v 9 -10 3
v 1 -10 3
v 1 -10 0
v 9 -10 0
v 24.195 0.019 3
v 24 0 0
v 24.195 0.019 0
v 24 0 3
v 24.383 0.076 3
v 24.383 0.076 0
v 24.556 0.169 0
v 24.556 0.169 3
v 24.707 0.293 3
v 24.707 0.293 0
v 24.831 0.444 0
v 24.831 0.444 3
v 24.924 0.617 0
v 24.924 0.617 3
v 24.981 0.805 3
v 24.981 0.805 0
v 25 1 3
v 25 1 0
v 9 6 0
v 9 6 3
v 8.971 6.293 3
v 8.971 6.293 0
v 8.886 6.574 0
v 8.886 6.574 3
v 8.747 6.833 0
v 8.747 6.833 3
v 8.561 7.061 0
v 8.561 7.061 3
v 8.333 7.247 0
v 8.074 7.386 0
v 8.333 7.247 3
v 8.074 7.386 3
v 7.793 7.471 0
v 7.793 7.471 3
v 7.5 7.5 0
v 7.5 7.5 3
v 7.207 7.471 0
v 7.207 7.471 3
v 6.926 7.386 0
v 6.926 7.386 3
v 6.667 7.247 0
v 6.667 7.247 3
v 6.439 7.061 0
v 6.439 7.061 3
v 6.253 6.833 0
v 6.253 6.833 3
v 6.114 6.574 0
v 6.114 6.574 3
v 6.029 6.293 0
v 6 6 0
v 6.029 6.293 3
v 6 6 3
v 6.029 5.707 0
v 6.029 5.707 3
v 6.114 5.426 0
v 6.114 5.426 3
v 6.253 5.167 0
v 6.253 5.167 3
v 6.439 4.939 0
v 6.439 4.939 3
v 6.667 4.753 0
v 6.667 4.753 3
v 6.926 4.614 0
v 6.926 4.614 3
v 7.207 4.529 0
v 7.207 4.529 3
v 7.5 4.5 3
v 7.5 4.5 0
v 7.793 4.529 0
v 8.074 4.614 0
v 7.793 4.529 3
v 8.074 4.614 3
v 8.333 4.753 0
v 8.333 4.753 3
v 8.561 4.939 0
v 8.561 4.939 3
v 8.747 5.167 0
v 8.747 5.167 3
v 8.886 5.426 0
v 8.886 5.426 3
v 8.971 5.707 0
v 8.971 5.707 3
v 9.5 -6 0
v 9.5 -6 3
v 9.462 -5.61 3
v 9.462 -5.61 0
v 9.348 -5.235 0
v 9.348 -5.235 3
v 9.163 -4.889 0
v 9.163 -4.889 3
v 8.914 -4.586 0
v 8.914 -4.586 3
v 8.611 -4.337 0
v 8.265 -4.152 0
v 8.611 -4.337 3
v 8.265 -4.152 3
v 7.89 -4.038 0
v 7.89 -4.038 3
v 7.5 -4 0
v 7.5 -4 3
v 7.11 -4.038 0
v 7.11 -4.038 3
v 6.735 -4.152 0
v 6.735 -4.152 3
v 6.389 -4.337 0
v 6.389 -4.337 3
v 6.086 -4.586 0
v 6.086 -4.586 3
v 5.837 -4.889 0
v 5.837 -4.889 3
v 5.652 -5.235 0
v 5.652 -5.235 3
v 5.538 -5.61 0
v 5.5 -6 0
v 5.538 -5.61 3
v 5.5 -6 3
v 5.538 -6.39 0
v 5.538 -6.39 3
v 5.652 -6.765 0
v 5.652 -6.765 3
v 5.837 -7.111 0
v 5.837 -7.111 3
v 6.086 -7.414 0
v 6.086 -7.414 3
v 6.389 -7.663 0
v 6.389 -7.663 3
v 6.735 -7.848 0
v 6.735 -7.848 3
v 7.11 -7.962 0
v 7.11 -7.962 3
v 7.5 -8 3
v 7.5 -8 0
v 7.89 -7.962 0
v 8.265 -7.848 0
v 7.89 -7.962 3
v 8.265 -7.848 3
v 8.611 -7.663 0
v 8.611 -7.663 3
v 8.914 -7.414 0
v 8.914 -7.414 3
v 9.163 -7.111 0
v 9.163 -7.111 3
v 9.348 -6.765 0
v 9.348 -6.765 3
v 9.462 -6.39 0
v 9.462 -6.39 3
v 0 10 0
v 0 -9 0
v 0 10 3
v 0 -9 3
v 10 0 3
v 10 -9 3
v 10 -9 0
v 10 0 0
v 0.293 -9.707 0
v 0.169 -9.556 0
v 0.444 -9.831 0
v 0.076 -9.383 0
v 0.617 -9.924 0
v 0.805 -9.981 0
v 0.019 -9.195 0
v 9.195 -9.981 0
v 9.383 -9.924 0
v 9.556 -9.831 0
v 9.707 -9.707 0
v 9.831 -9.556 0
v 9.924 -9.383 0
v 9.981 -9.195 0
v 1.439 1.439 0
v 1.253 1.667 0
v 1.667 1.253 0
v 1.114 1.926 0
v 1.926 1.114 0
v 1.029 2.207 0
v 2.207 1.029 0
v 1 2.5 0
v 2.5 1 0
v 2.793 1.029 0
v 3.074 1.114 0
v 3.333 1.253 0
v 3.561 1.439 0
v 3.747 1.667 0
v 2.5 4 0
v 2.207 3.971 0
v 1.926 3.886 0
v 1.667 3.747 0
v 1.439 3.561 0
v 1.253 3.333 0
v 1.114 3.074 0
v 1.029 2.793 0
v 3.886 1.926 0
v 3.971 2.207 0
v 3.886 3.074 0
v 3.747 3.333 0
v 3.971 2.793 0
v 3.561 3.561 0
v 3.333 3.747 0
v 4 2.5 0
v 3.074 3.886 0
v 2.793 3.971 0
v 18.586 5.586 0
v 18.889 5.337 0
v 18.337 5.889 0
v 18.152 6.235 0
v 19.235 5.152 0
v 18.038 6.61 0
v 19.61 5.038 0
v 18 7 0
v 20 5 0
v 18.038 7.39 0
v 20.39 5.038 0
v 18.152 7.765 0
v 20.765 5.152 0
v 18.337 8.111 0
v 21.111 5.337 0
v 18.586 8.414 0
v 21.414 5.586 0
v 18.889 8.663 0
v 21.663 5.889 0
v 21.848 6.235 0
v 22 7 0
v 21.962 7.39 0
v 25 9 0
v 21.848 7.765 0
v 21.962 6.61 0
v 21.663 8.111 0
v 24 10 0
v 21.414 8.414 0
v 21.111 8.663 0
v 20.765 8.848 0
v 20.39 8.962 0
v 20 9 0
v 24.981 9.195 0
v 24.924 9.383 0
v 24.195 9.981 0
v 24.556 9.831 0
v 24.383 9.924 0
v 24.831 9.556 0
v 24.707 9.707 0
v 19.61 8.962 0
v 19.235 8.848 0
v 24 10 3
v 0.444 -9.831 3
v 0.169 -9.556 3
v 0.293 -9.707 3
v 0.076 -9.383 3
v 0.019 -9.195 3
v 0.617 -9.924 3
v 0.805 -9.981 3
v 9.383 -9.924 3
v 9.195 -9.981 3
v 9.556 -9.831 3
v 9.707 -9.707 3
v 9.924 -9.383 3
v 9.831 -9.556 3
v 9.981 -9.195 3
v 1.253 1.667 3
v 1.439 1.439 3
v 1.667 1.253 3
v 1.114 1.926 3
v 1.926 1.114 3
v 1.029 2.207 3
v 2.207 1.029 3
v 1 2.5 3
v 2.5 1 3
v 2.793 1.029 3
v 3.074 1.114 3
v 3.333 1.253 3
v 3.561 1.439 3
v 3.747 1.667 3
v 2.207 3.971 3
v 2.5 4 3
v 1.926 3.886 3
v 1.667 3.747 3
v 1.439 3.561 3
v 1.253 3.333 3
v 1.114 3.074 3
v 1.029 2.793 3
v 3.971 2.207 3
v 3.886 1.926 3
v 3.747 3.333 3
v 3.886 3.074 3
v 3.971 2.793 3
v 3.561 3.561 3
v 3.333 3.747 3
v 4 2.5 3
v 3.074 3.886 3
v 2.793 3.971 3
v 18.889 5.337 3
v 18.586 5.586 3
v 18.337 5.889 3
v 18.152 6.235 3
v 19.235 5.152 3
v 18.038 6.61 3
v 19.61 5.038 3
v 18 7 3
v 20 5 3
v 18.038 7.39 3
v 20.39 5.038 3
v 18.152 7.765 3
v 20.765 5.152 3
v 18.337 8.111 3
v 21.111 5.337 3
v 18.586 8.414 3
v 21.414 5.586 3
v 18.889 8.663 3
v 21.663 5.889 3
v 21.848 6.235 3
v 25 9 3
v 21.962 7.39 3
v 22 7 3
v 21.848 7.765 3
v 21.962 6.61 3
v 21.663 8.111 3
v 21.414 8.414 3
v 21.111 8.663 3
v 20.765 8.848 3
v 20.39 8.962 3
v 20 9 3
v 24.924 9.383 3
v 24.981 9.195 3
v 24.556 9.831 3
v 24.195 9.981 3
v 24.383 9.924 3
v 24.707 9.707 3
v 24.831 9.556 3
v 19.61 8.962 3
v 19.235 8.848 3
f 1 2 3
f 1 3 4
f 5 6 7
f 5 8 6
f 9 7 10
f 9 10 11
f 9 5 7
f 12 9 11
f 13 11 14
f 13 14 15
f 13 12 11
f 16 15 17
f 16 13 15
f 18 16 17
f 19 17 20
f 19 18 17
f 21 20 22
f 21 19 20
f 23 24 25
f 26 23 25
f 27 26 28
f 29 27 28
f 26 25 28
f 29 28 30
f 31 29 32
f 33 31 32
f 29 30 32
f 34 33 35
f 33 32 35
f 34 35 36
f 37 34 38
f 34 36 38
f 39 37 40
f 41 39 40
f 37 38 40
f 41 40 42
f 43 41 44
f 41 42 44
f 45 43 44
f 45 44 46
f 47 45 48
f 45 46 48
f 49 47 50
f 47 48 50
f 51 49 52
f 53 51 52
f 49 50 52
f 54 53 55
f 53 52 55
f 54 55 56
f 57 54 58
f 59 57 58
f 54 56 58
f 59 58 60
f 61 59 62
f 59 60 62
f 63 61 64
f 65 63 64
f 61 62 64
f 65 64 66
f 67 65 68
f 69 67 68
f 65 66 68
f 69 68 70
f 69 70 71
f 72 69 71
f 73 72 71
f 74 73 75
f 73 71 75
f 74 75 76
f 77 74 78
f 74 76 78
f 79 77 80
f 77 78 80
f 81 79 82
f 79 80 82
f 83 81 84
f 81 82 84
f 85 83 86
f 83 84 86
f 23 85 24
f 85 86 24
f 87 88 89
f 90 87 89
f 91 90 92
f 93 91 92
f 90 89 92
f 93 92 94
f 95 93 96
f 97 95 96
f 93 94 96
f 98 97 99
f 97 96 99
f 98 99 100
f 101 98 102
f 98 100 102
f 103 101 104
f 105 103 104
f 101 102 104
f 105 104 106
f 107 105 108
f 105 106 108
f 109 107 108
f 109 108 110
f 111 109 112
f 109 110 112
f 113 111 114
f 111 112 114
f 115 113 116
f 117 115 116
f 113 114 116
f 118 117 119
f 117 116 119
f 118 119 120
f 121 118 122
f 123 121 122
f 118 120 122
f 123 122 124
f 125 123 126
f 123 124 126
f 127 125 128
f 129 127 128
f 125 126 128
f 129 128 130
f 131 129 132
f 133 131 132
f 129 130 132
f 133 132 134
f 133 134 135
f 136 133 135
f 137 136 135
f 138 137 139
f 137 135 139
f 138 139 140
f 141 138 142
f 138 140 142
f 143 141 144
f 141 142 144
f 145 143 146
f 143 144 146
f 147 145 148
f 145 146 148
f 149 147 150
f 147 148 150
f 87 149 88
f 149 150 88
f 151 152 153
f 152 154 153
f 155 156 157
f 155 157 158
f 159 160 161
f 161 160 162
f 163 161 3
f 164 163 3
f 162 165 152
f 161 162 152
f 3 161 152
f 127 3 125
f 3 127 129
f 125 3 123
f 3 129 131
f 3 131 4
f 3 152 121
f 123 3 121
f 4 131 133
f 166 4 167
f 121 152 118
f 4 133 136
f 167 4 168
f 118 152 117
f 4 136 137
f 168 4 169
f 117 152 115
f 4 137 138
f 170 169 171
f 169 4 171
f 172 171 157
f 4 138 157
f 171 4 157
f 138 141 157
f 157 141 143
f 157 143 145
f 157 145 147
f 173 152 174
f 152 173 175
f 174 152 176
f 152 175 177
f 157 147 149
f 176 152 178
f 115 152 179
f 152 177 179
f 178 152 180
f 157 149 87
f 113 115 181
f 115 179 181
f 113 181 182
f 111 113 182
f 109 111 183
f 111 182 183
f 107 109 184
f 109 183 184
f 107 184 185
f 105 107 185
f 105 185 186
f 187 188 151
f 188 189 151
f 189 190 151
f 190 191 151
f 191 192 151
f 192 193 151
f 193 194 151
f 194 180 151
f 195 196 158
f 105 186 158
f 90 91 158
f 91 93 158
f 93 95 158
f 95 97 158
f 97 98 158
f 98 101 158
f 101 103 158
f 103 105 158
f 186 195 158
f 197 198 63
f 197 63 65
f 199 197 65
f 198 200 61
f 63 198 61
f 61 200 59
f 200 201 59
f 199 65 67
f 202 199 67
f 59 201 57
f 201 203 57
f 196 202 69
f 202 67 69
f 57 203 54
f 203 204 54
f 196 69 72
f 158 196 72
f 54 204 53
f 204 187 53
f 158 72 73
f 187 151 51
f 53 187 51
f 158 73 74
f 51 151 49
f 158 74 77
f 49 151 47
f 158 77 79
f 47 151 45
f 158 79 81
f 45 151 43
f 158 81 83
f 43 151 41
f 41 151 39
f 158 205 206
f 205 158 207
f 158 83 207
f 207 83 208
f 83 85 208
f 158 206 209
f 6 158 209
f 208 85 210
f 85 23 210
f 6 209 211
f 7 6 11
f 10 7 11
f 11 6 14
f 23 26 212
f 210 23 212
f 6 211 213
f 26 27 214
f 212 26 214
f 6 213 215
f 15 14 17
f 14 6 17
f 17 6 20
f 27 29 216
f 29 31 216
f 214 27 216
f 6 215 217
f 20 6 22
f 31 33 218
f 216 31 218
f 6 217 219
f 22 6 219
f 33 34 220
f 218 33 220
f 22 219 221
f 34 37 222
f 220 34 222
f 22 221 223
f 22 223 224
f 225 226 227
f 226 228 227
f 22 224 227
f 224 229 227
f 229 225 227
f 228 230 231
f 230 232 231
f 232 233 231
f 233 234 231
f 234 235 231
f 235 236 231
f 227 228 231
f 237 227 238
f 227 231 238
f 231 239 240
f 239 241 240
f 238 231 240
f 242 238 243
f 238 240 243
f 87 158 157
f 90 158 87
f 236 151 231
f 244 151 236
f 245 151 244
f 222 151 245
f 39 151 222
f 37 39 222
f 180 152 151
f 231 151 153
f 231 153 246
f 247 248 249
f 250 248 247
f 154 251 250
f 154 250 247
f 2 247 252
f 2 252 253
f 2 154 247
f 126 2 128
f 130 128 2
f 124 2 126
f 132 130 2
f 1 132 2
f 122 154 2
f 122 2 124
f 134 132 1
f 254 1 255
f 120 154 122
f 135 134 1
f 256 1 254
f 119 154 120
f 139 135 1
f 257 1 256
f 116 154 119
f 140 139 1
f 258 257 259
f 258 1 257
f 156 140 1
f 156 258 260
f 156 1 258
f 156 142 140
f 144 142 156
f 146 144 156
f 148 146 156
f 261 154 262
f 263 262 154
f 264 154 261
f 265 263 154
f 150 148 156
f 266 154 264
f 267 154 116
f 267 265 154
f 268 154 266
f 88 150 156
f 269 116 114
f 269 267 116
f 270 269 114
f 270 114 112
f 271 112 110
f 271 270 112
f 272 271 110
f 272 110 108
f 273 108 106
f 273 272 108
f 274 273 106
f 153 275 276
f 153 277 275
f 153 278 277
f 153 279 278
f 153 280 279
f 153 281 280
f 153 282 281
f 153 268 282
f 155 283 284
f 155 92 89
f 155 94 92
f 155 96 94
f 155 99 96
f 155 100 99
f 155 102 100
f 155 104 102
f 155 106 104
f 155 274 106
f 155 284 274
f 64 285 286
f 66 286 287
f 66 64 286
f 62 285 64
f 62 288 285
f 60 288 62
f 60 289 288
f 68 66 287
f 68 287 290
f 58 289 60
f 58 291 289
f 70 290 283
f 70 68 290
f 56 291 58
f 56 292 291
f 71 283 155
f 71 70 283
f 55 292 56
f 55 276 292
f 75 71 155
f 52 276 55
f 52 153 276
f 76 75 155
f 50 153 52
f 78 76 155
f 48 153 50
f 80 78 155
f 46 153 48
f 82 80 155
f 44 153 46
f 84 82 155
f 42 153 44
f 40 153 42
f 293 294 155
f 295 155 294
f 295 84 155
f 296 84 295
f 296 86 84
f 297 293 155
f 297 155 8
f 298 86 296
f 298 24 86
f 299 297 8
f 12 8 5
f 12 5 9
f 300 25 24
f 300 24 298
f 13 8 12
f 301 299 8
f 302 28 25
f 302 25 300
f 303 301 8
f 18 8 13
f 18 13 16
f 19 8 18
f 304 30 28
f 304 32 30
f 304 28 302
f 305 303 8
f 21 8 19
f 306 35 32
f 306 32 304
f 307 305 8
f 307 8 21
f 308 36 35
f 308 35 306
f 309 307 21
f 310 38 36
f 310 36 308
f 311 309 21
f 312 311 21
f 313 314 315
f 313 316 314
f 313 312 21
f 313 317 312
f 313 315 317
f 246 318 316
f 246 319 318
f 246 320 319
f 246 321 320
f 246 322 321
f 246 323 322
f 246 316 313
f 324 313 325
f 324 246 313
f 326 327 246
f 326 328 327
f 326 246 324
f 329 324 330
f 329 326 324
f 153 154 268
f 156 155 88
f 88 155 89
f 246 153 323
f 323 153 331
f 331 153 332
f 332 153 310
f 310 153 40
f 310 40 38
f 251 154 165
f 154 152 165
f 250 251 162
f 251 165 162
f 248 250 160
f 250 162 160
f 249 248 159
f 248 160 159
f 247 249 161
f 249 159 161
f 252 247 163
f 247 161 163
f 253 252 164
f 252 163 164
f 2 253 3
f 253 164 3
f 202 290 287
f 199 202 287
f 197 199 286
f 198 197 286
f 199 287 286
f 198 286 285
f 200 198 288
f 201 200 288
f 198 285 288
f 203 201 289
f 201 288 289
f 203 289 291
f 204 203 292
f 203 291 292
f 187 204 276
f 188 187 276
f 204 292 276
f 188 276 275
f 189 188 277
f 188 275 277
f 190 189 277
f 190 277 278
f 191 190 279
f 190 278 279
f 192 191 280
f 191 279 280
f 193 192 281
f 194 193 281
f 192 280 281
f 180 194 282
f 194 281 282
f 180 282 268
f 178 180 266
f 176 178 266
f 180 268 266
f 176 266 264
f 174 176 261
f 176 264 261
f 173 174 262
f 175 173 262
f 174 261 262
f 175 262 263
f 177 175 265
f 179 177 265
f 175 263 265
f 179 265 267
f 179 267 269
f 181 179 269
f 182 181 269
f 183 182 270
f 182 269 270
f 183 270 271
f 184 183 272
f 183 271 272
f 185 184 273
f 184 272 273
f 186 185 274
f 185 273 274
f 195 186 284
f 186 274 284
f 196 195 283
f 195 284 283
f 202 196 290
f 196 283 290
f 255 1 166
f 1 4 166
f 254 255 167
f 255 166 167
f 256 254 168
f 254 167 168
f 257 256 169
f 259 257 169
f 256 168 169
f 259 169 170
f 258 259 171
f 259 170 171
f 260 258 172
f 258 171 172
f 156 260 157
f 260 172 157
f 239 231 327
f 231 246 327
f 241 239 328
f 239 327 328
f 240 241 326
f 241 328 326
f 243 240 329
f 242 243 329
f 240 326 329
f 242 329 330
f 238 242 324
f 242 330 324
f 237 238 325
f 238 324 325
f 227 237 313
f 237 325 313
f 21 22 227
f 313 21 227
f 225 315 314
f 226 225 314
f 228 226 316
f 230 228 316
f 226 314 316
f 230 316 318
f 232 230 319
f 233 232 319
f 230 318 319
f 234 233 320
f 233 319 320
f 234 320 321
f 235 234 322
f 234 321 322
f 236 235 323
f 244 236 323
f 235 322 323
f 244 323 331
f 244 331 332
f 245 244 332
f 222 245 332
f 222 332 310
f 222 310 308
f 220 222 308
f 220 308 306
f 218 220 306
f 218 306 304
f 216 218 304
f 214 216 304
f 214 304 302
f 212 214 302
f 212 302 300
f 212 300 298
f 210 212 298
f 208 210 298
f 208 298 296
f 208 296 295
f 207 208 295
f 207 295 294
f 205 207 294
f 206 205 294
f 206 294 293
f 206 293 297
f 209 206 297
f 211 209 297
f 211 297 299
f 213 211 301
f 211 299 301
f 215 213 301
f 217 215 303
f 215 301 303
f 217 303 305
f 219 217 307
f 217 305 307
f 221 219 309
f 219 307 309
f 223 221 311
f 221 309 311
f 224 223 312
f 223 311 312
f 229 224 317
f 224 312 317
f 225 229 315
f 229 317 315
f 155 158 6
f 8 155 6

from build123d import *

# Parameters (mm, degrees)
SKETCH_1_W          = 25
SKETCH_1_H          = 10
EXTRUDE_1_DEPTH     = 3
SKETCH_2_R          = 1.5
CUT_EXTRUDE_1_DEPTH = 3
SKETCH_3_R          = 2
CUT_EXTRUDE_2_DEPTH = 10
SKETCH_4_W          = 10
SKETCH_4_H          = 10
EXTRUDE_2_DEPTH     = 3
SKETCH_5_R          = 2
CUT_EXTRUDE_3_DEPTH = 3
FILLET_1_R          = 1


with BuildPart() as part:
    # 草图1 → 凸台-拉伸1 (new body)
    with BuildSketch(Plane.XY):
        with Locations((12.5, 5)):
            Rectangle(SKETCH_1_W, SKETCH_1_H)
    extrude(amount=EXTRUDE_1_DEPTH)

    # 草图2 → 切除-拉伸1 (cut)
    with BuildSketch(Plane.XY.offset(3)):
        with Locations((2.5, 2.5)):
            Circle(SKETCH_2_R)
        with Locations((7.5, 6)):
            Circle(SKETCH_2_R)
    extrude(amount=-CUT_EXTRUDE_1_DEPTH, mode=Mode.SUBTRACT)

    # 草图3 → 切除-拉伸2 (cut)
    with BuildSketch(Plane.XY.offset(3)):
        with Locations((20, 7)):
            Circle(SKETCH_3_R)
    extrude(amount=-CUT_EXTRUDE_2_DEPTH, mode=Mode.SUBTRACT)

    # 草图4 → 凸台-拉伸2 (add)
    with BuildSketch(Plane.XY.offset(3)):
        with Locations((5, -5)):
            Rectangle(SKETCH_4_W, SKETCH_4_H)
    extrude(amount=-EXTRUDE_2_DEPTH)

    # 草图5 → 切除-拉伸3 (cut)
    with BuildSketch(Plane.XY.offset(3)):
        with Locations((7.5, -6)):
            Circle(SKETCH_5_R)
    extrude(amount=-CUT_EXTRUDE_3_DEPTH, mode=Mode.SUBTRACT)

    # 圆角1
    fillet_1_edges = [part.edges().sort_by_distance(p)[0] for p in [
        (0, -10, 1.5),
        (10, -10, 1.5),
        (25, 10, 1.5),
        (25, 0, 1.5),
    ]]
    fillet(fillet_1_edges, radius=FILLET_1_R)


solid = part.part
